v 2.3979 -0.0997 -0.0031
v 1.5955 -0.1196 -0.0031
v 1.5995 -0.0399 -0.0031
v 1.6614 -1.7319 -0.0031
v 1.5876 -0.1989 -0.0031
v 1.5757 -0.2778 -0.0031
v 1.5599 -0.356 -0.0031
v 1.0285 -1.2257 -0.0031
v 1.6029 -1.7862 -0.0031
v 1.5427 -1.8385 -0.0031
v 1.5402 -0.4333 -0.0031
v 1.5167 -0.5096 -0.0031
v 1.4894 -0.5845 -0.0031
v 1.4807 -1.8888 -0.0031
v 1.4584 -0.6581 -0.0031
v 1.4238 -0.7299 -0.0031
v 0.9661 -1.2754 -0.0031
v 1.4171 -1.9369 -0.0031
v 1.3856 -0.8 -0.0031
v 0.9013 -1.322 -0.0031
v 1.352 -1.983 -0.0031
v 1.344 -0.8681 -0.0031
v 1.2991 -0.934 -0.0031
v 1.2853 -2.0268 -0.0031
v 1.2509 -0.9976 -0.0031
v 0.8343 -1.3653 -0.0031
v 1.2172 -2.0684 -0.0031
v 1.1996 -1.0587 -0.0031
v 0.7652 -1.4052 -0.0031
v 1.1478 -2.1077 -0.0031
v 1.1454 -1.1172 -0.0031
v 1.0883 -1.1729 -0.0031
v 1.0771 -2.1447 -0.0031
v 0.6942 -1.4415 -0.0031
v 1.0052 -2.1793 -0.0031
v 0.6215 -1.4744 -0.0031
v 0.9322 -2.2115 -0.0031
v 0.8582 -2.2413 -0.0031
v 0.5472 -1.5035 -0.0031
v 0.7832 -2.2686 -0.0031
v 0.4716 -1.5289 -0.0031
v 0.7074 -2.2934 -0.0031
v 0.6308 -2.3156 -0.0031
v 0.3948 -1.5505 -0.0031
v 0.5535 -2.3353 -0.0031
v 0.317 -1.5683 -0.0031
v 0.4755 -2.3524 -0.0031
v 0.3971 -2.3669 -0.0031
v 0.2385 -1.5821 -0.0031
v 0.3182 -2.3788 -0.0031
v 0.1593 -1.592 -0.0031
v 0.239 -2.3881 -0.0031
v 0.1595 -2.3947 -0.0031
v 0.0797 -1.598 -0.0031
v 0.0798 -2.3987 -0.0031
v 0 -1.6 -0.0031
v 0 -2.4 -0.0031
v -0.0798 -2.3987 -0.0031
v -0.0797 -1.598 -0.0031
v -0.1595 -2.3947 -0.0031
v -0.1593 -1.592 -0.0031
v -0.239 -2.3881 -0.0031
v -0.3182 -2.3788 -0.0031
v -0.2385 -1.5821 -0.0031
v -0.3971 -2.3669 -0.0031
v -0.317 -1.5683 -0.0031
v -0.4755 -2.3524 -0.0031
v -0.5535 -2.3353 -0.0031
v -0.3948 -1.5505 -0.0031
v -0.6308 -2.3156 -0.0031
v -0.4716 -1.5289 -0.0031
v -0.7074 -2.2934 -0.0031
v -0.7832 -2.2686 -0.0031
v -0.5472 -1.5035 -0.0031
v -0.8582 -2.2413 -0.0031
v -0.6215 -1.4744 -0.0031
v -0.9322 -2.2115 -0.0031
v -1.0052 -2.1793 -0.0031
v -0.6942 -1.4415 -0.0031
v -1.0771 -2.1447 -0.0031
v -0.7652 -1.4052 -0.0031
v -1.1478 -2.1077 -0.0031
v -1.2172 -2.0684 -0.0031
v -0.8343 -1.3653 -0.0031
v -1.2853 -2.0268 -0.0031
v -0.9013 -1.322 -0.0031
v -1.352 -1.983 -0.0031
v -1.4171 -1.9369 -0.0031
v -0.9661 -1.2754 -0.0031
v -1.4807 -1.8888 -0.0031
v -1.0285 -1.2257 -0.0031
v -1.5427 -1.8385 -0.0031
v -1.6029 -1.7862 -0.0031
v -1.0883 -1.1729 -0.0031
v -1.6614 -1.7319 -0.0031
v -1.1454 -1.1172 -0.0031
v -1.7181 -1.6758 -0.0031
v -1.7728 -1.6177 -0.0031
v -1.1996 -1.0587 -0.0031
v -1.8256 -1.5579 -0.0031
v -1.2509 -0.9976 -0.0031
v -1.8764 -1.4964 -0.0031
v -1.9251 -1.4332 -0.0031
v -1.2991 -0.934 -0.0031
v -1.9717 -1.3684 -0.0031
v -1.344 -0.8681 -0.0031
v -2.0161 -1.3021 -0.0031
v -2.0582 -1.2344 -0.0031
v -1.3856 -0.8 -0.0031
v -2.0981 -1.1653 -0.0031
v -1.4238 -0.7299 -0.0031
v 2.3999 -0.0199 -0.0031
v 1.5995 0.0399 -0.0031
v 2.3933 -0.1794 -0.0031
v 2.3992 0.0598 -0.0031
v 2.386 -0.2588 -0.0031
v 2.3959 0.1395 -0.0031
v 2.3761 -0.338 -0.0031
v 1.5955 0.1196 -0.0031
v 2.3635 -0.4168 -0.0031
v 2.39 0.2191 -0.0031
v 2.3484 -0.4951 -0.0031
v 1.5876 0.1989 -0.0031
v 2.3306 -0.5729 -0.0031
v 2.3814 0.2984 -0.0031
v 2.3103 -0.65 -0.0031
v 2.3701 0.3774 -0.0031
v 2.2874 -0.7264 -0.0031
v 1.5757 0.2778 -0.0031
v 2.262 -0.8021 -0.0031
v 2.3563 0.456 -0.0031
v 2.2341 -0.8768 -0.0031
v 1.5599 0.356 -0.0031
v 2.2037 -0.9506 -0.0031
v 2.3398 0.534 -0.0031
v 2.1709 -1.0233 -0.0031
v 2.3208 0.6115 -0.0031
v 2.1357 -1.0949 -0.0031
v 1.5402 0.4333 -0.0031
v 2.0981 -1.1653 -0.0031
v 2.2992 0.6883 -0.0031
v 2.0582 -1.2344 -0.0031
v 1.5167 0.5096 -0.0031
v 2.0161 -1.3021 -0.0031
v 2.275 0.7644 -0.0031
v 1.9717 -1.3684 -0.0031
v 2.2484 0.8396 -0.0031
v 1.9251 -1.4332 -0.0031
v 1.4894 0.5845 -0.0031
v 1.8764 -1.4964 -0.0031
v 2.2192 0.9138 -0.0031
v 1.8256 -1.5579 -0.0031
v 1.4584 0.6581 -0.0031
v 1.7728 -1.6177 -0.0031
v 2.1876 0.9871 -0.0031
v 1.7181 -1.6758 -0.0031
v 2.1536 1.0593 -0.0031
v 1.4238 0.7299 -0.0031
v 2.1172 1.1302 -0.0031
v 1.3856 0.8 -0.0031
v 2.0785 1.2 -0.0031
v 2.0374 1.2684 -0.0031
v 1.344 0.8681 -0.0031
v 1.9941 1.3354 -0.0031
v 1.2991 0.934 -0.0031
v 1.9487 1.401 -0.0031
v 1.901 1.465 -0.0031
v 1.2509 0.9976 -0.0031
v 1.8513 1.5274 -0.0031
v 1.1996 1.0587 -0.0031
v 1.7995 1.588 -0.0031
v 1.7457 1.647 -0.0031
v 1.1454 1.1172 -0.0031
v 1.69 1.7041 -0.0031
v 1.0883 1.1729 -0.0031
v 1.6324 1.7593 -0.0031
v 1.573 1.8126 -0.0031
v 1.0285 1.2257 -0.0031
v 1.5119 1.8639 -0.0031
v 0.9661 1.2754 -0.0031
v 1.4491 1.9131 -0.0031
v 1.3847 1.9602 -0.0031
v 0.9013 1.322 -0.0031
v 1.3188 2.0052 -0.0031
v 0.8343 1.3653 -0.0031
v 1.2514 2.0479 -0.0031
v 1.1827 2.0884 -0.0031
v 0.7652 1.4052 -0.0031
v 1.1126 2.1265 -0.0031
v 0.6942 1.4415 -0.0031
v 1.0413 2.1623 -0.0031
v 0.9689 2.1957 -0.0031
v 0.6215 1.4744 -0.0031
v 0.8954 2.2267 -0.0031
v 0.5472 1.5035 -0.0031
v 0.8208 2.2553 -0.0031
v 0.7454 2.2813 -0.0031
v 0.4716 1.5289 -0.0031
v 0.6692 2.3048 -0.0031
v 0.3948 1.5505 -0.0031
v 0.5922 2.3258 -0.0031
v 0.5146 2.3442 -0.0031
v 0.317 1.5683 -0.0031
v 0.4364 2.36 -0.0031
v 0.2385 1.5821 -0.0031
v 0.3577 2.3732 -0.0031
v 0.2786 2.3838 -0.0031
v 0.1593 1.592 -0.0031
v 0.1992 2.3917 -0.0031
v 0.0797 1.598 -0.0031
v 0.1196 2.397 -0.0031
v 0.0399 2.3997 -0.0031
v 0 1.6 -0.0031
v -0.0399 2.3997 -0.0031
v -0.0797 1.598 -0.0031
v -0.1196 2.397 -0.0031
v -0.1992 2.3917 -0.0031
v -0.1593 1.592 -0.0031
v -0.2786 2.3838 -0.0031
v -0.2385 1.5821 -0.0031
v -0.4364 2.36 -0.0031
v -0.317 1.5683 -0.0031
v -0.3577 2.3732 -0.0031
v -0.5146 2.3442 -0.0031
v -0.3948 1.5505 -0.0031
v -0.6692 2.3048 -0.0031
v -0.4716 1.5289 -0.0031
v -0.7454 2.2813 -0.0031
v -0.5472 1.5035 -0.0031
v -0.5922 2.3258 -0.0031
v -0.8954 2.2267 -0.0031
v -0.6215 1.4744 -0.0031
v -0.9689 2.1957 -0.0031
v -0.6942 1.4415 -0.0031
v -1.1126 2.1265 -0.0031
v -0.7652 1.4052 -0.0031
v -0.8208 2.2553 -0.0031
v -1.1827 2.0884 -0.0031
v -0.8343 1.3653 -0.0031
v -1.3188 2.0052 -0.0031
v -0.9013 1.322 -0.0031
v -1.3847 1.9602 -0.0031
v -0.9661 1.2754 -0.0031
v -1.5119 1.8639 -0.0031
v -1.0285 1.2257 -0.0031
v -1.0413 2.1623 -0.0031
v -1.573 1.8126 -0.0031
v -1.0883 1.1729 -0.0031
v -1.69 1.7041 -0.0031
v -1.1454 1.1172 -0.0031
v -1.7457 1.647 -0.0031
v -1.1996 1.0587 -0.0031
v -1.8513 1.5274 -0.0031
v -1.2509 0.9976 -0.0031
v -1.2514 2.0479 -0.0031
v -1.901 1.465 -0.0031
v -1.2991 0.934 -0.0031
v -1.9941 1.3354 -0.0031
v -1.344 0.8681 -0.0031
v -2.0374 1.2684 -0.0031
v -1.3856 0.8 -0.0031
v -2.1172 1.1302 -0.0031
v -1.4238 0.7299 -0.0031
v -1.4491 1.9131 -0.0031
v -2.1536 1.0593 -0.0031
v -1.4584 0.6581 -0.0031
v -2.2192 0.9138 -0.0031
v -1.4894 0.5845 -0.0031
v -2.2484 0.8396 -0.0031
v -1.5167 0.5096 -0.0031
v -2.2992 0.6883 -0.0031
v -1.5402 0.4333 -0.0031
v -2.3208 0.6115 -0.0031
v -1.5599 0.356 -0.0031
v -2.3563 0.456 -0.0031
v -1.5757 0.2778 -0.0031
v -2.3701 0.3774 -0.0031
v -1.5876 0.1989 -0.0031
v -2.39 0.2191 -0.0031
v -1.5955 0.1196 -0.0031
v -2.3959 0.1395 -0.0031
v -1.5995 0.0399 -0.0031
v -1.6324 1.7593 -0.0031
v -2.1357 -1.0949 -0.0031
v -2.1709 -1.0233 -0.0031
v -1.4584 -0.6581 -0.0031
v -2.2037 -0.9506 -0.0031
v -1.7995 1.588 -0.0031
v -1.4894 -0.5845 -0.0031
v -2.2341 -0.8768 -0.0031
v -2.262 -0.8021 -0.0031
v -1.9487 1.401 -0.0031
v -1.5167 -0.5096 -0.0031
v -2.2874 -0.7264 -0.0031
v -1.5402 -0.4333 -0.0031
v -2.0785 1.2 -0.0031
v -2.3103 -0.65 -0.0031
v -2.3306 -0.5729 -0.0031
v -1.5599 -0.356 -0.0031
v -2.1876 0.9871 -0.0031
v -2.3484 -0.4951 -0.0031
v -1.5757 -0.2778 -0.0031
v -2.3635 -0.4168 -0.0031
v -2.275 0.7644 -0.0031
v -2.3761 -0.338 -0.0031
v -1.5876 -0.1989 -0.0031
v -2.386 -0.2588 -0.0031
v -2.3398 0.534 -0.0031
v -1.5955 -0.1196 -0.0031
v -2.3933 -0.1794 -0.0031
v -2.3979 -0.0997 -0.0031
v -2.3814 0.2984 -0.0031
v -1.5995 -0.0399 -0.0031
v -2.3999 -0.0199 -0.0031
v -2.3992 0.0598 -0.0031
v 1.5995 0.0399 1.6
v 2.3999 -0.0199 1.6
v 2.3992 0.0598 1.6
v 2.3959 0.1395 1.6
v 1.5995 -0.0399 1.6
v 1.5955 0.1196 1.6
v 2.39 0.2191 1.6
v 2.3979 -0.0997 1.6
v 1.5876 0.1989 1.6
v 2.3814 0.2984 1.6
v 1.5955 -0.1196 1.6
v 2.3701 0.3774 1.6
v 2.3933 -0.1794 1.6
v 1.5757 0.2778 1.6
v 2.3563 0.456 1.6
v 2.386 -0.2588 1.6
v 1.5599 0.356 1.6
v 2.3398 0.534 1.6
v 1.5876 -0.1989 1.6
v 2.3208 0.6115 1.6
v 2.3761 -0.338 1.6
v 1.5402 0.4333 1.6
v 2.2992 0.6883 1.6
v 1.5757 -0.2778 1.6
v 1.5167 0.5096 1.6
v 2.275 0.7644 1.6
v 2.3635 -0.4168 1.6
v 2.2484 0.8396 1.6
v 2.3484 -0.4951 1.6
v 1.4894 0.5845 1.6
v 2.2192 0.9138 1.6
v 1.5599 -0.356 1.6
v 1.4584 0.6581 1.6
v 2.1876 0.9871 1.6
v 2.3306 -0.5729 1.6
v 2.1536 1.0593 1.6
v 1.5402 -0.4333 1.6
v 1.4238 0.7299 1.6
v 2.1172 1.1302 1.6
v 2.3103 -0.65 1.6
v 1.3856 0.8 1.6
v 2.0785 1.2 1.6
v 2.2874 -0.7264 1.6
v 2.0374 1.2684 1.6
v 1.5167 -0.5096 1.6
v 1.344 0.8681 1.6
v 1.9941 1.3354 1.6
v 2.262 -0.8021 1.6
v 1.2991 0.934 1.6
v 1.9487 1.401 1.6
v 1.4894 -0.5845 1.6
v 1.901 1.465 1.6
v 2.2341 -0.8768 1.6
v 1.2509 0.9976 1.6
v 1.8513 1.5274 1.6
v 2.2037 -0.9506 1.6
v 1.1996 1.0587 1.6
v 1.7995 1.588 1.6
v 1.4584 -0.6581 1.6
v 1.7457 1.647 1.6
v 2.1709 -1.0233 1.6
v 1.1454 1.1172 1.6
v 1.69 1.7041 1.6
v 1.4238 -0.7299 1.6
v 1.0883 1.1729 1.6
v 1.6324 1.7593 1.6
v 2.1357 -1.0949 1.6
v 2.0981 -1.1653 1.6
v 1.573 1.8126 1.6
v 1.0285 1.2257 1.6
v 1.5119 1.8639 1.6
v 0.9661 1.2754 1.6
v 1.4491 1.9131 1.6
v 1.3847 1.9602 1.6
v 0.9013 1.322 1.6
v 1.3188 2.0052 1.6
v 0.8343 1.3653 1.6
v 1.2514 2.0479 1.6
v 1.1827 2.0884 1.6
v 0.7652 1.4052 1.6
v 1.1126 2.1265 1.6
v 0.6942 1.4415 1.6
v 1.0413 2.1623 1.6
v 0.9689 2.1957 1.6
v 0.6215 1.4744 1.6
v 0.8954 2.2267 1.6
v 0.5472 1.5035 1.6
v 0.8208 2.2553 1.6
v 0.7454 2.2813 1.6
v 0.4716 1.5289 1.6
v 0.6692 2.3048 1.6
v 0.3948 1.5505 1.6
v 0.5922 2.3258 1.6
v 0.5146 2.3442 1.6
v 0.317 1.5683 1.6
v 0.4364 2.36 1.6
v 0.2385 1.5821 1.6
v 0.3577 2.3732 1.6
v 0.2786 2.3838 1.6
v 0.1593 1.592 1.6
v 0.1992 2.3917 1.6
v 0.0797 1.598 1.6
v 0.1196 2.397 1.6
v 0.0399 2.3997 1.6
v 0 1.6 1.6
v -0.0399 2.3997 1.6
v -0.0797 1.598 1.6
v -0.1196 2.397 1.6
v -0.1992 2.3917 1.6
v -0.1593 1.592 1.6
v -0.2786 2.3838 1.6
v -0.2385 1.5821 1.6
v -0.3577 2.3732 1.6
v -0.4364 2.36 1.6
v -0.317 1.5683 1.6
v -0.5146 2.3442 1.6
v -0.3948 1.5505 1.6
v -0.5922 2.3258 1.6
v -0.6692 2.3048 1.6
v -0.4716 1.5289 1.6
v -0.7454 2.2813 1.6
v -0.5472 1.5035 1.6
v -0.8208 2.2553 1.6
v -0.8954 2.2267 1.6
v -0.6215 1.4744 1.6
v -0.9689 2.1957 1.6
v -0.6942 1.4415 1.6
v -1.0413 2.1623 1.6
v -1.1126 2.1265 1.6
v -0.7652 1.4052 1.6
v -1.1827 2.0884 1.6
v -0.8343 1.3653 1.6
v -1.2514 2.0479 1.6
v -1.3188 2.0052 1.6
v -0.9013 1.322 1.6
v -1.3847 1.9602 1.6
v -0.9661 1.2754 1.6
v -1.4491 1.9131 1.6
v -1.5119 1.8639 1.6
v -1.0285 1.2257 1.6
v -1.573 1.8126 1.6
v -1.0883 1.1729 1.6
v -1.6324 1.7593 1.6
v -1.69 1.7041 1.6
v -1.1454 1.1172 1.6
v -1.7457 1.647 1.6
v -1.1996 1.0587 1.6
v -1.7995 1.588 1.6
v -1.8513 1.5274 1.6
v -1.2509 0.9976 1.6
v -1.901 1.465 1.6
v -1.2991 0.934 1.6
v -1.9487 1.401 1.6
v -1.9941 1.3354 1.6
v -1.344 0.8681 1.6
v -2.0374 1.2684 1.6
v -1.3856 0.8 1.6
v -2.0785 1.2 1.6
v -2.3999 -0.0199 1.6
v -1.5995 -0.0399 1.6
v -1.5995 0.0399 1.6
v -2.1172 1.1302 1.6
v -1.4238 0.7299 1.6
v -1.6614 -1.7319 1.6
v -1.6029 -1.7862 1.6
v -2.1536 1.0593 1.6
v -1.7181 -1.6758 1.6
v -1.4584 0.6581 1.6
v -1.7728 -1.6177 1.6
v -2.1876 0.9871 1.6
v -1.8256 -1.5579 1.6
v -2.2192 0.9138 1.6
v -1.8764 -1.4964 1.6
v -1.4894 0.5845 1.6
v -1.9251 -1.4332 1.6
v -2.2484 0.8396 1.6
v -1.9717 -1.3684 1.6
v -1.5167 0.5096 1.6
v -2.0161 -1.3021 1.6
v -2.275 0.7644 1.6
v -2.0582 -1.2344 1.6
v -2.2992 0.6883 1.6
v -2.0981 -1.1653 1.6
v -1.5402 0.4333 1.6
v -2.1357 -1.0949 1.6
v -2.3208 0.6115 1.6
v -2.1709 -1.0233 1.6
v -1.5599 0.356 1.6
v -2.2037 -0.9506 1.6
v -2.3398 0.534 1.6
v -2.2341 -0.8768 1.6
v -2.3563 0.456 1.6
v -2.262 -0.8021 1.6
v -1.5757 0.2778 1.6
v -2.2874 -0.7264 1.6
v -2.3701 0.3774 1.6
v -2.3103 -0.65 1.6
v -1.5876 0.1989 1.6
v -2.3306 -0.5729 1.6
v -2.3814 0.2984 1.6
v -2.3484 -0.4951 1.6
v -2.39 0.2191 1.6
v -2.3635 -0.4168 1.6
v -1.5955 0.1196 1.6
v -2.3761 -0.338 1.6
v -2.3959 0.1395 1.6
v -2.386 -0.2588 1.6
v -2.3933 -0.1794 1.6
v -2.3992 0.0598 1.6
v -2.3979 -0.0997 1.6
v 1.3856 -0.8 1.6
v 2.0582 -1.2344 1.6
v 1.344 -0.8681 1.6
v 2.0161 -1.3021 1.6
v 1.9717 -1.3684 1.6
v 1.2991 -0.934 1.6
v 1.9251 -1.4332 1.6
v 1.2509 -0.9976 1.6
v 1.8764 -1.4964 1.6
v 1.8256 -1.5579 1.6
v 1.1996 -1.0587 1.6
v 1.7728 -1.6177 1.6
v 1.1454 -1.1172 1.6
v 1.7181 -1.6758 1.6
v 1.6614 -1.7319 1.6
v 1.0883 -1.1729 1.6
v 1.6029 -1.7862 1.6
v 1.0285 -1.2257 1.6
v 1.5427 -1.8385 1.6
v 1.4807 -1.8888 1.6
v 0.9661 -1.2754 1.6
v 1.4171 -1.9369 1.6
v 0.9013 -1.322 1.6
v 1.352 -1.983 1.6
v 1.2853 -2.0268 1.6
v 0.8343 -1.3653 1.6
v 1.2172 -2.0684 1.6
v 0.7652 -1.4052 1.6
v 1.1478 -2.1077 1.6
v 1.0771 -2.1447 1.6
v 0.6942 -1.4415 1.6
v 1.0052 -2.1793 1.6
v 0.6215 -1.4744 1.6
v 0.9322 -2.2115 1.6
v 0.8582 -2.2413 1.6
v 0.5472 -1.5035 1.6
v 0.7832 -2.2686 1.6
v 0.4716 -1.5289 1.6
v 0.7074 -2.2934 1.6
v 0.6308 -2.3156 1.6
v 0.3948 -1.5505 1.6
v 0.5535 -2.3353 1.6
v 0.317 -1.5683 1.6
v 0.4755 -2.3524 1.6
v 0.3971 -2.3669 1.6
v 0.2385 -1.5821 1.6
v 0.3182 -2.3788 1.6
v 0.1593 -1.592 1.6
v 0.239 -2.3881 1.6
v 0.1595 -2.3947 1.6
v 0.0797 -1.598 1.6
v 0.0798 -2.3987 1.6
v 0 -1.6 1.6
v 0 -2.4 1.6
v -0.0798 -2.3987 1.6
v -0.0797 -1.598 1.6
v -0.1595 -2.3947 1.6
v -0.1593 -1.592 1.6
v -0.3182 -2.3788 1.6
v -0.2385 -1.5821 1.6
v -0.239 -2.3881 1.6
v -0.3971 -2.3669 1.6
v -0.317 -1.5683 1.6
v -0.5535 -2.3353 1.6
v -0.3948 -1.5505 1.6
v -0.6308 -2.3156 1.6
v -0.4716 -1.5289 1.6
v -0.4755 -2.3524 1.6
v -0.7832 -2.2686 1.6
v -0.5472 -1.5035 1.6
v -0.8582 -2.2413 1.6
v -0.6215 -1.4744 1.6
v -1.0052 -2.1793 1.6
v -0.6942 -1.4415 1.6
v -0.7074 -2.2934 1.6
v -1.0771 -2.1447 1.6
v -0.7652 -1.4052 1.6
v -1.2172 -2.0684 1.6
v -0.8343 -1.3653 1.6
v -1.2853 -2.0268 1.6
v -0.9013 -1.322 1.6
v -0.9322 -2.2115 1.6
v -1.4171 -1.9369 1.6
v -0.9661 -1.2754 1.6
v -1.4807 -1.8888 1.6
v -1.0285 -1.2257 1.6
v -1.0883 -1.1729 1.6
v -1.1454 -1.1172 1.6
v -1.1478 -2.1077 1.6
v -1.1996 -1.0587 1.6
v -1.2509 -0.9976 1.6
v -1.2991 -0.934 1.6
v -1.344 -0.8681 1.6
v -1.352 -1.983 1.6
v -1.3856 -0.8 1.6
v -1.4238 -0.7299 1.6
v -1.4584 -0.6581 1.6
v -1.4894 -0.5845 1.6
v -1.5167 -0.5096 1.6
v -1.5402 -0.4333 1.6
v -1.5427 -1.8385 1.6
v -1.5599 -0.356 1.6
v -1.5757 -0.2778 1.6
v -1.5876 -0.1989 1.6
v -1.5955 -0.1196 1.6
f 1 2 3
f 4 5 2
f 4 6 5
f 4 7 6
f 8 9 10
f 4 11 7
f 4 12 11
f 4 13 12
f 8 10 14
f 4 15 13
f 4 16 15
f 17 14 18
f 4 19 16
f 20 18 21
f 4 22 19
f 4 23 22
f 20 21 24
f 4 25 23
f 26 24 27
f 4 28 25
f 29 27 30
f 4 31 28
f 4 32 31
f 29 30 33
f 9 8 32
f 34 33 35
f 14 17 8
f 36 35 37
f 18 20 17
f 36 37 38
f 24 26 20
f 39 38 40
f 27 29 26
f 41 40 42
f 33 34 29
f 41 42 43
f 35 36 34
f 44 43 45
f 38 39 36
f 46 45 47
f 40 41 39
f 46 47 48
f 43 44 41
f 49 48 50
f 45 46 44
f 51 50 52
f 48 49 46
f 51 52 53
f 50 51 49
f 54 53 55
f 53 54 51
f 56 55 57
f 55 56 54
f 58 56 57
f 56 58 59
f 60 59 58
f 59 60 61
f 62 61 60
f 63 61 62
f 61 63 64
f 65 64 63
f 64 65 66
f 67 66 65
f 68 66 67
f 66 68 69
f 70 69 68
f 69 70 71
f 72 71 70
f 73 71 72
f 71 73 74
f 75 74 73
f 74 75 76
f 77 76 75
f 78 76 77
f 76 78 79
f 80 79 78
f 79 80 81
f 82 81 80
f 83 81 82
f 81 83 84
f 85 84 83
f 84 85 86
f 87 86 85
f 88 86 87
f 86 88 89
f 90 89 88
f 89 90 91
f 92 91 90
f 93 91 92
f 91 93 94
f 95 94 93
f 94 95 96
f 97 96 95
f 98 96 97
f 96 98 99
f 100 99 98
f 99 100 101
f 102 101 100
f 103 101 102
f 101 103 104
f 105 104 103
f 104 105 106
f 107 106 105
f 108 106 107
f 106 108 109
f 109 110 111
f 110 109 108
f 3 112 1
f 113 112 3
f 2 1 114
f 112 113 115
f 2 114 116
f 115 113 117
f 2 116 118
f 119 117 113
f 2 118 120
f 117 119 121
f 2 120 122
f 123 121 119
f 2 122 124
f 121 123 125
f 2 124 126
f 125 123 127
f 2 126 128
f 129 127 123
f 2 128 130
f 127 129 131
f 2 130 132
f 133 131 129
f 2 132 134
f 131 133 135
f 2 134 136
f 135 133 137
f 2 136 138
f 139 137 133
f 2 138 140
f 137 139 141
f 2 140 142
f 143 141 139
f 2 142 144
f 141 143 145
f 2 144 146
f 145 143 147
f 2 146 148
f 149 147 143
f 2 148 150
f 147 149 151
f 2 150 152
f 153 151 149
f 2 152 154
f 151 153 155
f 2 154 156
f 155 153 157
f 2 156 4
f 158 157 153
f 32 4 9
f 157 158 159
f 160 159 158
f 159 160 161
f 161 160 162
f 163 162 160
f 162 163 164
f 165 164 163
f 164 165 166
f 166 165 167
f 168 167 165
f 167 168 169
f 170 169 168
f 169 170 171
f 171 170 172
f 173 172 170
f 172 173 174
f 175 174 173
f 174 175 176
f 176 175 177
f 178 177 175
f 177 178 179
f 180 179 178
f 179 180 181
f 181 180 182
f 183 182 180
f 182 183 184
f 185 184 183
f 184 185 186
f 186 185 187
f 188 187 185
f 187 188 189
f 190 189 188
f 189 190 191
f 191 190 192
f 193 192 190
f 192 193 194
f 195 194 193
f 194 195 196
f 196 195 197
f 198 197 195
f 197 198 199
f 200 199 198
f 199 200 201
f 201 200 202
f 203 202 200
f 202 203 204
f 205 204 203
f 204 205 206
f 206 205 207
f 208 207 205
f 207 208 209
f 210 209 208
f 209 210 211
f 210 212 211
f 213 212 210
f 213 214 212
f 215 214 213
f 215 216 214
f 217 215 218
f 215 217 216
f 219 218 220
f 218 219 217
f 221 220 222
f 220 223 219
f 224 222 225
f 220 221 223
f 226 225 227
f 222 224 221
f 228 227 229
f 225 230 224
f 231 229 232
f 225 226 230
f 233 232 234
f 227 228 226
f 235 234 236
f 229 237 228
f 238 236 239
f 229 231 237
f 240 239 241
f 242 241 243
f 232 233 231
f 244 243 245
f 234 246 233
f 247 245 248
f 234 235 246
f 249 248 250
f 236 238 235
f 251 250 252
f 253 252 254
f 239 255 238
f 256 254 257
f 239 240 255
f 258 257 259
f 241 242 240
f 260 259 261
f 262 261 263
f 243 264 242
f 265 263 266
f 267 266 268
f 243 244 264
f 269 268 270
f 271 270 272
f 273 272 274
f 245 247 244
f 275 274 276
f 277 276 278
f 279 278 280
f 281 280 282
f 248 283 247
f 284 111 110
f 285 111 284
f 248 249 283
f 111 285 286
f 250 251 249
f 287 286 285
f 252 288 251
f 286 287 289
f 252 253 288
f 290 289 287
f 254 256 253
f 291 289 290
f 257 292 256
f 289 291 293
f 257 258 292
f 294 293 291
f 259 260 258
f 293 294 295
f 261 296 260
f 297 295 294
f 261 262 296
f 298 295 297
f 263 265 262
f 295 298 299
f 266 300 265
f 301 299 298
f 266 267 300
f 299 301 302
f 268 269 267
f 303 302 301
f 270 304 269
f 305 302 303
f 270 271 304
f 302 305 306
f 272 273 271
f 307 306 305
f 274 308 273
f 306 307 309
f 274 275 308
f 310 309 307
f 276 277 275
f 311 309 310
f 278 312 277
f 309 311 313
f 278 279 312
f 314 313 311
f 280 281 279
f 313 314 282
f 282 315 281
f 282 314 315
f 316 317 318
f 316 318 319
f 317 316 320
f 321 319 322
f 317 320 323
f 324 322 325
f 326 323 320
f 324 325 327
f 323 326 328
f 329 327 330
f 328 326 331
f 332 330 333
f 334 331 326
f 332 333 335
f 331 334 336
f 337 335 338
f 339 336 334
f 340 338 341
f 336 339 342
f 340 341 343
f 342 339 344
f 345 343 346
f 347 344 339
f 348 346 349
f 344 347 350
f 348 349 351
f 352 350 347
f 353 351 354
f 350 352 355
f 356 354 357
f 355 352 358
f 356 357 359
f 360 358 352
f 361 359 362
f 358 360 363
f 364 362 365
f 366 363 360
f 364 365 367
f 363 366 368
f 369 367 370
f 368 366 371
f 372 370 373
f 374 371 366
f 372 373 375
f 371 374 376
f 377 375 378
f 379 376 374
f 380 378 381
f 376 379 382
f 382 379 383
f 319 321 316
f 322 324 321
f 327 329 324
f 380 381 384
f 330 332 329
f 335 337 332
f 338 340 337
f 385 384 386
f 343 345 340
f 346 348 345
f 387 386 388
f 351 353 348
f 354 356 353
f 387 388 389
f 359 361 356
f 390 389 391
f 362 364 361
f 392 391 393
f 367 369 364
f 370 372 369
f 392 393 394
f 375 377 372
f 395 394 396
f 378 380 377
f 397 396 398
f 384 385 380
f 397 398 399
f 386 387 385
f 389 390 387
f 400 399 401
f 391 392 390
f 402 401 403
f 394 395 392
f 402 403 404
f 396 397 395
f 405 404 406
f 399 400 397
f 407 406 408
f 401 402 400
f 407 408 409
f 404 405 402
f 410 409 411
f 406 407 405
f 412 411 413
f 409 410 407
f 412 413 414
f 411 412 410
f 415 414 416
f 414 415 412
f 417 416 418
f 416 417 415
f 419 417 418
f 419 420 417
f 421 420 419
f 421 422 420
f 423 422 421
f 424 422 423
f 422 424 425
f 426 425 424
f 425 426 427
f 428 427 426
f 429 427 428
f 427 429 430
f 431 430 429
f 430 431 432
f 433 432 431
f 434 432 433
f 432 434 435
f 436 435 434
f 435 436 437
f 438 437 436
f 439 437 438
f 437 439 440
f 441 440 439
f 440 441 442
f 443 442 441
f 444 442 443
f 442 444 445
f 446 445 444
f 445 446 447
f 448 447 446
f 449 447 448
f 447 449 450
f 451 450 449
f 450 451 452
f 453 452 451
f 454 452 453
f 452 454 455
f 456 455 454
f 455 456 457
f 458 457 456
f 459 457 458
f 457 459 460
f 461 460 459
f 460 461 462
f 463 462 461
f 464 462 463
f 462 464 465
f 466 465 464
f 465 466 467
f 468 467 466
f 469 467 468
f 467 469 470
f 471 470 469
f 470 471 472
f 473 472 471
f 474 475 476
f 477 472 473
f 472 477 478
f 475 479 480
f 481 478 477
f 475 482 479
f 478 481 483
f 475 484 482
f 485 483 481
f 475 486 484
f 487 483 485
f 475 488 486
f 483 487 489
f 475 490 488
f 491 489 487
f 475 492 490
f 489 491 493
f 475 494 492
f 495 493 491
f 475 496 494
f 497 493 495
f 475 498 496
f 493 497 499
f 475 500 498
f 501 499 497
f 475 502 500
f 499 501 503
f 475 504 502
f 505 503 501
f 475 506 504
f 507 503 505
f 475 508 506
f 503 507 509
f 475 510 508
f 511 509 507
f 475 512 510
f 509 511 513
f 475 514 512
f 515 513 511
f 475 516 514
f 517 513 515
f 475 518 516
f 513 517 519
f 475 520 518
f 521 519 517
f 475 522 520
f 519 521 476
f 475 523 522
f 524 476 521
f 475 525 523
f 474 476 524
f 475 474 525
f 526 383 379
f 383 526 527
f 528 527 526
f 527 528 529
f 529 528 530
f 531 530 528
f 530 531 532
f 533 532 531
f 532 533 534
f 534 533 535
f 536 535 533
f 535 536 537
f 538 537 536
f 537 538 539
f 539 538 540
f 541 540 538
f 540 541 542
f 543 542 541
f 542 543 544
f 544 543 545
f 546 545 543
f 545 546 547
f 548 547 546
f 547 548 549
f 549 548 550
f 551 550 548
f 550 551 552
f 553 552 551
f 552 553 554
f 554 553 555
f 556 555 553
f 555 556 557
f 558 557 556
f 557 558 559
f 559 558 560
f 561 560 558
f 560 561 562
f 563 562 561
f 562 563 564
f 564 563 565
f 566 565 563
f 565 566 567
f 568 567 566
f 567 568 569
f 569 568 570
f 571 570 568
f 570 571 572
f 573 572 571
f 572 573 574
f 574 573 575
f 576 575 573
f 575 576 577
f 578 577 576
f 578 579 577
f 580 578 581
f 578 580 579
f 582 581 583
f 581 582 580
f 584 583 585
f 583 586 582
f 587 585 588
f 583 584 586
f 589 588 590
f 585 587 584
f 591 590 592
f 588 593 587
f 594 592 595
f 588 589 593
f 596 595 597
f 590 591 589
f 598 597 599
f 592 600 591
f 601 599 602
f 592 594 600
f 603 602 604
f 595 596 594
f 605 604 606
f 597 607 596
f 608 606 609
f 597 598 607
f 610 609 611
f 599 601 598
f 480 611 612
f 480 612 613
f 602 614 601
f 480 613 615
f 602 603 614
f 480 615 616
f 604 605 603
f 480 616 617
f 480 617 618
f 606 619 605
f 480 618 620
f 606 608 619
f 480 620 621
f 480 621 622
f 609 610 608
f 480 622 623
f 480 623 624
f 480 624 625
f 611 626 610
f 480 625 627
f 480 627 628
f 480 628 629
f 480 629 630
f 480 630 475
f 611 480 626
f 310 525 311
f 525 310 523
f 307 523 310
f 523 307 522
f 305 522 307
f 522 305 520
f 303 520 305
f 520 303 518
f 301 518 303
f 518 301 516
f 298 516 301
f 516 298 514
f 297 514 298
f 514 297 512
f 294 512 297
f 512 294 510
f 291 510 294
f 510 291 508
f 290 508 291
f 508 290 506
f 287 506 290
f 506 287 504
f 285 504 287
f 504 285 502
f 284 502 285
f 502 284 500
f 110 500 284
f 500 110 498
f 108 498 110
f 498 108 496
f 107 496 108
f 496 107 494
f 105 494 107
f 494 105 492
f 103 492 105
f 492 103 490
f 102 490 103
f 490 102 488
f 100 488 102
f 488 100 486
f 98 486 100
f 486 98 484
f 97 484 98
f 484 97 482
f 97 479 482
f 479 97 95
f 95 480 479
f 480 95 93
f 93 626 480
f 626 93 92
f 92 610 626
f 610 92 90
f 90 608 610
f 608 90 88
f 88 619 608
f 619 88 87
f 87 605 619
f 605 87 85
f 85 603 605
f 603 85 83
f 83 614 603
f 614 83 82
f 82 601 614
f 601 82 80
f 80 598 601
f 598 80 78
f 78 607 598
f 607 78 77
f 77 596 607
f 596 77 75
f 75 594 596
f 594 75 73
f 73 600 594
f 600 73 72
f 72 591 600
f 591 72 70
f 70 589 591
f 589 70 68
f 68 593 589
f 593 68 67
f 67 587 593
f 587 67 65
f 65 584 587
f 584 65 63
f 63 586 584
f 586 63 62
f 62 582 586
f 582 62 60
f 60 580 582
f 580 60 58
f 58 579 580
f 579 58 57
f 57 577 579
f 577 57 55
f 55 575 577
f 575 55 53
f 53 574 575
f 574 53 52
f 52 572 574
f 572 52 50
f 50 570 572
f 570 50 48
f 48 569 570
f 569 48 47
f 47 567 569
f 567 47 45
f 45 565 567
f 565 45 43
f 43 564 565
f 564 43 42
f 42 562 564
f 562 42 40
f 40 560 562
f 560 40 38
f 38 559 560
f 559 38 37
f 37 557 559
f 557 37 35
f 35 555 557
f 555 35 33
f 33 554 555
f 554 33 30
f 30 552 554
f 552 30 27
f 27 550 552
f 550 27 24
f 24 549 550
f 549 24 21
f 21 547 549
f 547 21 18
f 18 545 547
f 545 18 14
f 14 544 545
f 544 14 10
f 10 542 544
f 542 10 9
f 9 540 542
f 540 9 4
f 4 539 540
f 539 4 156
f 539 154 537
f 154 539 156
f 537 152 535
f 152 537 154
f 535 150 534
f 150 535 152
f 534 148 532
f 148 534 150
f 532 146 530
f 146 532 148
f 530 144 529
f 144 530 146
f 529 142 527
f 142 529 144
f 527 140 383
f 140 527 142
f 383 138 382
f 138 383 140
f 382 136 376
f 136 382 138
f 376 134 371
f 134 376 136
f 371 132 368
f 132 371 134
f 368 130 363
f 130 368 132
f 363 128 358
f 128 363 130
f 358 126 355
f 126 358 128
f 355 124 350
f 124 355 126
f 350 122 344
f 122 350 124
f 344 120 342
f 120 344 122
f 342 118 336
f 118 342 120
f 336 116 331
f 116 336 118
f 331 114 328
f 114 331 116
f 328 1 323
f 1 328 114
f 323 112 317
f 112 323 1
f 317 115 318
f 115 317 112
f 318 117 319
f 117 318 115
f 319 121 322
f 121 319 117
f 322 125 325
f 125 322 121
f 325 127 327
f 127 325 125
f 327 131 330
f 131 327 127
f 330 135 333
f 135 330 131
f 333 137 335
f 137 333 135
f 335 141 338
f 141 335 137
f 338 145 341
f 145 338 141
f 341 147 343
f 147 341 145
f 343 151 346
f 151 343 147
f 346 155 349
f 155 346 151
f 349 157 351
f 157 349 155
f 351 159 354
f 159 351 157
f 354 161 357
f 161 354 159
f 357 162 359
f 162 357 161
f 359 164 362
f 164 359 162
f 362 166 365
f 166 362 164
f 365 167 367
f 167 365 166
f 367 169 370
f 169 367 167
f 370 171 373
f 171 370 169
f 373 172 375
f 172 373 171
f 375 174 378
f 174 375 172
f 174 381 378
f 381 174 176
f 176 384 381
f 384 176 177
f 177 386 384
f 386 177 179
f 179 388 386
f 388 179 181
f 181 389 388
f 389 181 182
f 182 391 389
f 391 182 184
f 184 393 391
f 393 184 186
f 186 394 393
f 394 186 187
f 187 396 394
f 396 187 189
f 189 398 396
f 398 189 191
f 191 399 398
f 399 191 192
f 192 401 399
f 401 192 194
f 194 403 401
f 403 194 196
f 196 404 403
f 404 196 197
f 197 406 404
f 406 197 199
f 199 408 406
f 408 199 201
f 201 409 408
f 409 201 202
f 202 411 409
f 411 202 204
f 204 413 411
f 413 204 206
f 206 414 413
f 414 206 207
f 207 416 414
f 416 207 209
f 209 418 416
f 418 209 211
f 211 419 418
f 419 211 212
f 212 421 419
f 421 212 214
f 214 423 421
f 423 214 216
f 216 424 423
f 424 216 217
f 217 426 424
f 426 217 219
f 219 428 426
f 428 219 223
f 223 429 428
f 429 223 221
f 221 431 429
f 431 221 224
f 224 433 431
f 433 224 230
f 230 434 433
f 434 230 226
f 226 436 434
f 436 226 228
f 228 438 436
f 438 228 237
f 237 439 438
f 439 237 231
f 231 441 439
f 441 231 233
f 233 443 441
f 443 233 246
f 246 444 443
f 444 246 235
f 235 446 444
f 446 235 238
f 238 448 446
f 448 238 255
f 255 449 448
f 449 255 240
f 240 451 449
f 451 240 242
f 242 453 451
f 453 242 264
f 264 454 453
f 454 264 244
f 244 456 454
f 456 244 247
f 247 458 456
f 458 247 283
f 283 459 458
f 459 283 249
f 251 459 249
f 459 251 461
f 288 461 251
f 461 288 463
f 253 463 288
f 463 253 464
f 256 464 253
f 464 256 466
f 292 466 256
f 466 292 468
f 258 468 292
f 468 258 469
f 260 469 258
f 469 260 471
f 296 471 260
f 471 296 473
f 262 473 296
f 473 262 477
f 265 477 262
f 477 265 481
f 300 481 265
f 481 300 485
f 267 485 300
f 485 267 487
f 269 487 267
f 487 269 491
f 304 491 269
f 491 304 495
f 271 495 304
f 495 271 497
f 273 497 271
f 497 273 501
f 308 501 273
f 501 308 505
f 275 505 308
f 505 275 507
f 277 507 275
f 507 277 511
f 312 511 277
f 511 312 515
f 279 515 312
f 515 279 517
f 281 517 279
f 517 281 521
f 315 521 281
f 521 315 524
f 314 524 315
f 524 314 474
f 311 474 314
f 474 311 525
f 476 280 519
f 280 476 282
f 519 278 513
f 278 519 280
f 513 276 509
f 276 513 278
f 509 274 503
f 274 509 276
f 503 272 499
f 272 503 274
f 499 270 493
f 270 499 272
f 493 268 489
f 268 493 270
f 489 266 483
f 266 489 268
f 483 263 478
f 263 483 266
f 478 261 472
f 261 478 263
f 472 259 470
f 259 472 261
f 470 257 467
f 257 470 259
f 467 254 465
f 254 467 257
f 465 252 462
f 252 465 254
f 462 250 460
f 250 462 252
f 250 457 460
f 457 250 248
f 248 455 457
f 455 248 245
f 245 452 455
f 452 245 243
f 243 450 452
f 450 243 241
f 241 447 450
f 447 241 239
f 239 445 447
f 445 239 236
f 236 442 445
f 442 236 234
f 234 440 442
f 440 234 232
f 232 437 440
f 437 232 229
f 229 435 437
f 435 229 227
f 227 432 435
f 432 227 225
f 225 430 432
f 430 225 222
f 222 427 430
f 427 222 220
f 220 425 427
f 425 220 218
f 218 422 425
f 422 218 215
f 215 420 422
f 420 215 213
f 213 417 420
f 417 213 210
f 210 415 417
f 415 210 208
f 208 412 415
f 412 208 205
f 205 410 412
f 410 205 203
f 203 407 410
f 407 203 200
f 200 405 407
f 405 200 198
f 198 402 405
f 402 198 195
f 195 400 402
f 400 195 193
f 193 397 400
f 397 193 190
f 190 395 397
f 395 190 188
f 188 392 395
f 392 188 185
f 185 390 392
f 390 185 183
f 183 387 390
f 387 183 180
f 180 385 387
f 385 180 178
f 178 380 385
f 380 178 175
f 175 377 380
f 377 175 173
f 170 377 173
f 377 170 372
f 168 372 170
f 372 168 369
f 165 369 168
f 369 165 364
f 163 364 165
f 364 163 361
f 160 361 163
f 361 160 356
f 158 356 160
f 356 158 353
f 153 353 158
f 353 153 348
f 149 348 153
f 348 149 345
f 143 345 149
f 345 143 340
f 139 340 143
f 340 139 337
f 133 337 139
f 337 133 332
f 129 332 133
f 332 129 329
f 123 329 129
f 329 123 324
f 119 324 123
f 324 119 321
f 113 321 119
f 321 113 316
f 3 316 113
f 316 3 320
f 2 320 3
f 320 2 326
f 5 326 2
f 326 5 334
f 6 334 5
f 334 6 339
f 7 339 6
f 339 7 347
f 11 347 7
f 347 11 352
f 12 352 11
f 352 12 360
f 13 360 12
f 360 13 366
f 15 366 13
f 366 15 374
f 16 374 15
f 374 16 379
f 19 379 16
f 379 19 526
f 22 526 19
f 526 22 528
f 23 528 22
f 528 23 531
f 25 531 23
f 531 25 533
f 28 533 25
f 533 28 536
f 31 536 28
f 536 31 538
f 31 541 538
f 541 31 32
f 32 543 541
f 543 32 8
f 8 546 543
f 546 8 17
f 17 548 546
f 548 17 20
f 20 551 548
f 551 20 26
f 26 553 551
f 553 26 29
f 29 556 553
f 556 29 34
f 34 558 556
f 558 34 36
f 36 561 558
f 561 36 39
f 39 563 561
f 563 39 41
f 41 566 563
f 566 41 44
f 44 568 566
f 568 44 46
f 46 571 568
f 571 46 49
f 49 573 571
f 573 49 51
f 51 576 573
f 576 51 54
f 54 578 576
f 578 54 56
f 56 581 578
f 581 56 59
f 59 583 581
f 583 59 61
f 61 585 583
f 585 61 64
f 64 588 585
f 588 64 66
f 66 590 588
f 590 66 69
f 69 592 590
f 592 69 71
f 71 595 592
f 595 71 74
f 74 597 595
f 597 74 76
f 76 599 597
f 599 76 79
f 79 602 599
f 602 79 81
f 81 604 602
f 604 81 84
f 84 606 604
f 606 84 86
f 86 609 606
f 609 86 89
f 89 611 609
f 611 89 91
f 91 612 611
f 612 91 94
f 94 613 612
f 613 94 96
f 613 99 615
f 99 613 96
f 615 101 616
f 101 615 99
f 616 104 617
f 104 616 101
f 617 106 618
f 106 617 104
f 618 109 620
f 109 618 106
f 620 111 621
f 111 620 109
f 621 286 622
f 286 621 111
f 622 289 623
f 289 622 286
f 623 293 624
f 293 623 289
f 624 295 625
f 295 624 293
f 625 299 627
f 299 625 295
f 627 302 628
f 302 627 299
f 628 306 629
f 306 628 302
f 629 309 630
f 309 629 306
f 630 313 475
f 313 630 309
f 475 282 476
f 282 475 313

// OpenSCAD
use <../lib.scad>
use <4182.scad>
use <4183.scad>
$fa=1; $fs=0.2;
function ldraw_lib__4182c01(realsolid=false) = [
// 0 Train Door  1 x  4 x  5 Right with TransClear Glass
// 0 Name: 4182c01.dat
// 0 Author: Steffen [Steffen]
// 0 !LDRAW_ORG Shortcut UPDATE 2013-01
// 0 !LICENSE Licensed under CC BY 2.0 and CC BY 4.0 : see CAreadme.txt
// 
// 0 BFC CERTIFY CW
  [0,"BFC","CERTIFY"],
  [0,"BFC","CW"],
// 
// 0 !HISTORY 2013-07-21 [PTadmin] Official Update 2013-01
// 
// 
// 1 16 0 0 0 1 0 0 0 1 0 0 0 1 4182.dat
  [1,16,0,0,0,1,0,0,0,1,0,0,0,1, ldraw_lib__4182(realsolid)],
// 1 47 0 0 60 -1 0 0 0 1 0 0 0 -1 4183.dat
  [1,47,0,0,60,-1,0,0,0,1,0,0,0,-1, ldraw_lib__4183(realsolid)],
];
module ldraw_lib__4182c01(step=0, col=false, unit=2/5, alt=false, line=0.2, solid=!$preview)
    makepoly(ldraw_lib__4182c01(solid), step=step, col=col, unit=unit, alt=alt, line=line, solid=solid);
ldraw_lib__4182c01(line=0.2);
